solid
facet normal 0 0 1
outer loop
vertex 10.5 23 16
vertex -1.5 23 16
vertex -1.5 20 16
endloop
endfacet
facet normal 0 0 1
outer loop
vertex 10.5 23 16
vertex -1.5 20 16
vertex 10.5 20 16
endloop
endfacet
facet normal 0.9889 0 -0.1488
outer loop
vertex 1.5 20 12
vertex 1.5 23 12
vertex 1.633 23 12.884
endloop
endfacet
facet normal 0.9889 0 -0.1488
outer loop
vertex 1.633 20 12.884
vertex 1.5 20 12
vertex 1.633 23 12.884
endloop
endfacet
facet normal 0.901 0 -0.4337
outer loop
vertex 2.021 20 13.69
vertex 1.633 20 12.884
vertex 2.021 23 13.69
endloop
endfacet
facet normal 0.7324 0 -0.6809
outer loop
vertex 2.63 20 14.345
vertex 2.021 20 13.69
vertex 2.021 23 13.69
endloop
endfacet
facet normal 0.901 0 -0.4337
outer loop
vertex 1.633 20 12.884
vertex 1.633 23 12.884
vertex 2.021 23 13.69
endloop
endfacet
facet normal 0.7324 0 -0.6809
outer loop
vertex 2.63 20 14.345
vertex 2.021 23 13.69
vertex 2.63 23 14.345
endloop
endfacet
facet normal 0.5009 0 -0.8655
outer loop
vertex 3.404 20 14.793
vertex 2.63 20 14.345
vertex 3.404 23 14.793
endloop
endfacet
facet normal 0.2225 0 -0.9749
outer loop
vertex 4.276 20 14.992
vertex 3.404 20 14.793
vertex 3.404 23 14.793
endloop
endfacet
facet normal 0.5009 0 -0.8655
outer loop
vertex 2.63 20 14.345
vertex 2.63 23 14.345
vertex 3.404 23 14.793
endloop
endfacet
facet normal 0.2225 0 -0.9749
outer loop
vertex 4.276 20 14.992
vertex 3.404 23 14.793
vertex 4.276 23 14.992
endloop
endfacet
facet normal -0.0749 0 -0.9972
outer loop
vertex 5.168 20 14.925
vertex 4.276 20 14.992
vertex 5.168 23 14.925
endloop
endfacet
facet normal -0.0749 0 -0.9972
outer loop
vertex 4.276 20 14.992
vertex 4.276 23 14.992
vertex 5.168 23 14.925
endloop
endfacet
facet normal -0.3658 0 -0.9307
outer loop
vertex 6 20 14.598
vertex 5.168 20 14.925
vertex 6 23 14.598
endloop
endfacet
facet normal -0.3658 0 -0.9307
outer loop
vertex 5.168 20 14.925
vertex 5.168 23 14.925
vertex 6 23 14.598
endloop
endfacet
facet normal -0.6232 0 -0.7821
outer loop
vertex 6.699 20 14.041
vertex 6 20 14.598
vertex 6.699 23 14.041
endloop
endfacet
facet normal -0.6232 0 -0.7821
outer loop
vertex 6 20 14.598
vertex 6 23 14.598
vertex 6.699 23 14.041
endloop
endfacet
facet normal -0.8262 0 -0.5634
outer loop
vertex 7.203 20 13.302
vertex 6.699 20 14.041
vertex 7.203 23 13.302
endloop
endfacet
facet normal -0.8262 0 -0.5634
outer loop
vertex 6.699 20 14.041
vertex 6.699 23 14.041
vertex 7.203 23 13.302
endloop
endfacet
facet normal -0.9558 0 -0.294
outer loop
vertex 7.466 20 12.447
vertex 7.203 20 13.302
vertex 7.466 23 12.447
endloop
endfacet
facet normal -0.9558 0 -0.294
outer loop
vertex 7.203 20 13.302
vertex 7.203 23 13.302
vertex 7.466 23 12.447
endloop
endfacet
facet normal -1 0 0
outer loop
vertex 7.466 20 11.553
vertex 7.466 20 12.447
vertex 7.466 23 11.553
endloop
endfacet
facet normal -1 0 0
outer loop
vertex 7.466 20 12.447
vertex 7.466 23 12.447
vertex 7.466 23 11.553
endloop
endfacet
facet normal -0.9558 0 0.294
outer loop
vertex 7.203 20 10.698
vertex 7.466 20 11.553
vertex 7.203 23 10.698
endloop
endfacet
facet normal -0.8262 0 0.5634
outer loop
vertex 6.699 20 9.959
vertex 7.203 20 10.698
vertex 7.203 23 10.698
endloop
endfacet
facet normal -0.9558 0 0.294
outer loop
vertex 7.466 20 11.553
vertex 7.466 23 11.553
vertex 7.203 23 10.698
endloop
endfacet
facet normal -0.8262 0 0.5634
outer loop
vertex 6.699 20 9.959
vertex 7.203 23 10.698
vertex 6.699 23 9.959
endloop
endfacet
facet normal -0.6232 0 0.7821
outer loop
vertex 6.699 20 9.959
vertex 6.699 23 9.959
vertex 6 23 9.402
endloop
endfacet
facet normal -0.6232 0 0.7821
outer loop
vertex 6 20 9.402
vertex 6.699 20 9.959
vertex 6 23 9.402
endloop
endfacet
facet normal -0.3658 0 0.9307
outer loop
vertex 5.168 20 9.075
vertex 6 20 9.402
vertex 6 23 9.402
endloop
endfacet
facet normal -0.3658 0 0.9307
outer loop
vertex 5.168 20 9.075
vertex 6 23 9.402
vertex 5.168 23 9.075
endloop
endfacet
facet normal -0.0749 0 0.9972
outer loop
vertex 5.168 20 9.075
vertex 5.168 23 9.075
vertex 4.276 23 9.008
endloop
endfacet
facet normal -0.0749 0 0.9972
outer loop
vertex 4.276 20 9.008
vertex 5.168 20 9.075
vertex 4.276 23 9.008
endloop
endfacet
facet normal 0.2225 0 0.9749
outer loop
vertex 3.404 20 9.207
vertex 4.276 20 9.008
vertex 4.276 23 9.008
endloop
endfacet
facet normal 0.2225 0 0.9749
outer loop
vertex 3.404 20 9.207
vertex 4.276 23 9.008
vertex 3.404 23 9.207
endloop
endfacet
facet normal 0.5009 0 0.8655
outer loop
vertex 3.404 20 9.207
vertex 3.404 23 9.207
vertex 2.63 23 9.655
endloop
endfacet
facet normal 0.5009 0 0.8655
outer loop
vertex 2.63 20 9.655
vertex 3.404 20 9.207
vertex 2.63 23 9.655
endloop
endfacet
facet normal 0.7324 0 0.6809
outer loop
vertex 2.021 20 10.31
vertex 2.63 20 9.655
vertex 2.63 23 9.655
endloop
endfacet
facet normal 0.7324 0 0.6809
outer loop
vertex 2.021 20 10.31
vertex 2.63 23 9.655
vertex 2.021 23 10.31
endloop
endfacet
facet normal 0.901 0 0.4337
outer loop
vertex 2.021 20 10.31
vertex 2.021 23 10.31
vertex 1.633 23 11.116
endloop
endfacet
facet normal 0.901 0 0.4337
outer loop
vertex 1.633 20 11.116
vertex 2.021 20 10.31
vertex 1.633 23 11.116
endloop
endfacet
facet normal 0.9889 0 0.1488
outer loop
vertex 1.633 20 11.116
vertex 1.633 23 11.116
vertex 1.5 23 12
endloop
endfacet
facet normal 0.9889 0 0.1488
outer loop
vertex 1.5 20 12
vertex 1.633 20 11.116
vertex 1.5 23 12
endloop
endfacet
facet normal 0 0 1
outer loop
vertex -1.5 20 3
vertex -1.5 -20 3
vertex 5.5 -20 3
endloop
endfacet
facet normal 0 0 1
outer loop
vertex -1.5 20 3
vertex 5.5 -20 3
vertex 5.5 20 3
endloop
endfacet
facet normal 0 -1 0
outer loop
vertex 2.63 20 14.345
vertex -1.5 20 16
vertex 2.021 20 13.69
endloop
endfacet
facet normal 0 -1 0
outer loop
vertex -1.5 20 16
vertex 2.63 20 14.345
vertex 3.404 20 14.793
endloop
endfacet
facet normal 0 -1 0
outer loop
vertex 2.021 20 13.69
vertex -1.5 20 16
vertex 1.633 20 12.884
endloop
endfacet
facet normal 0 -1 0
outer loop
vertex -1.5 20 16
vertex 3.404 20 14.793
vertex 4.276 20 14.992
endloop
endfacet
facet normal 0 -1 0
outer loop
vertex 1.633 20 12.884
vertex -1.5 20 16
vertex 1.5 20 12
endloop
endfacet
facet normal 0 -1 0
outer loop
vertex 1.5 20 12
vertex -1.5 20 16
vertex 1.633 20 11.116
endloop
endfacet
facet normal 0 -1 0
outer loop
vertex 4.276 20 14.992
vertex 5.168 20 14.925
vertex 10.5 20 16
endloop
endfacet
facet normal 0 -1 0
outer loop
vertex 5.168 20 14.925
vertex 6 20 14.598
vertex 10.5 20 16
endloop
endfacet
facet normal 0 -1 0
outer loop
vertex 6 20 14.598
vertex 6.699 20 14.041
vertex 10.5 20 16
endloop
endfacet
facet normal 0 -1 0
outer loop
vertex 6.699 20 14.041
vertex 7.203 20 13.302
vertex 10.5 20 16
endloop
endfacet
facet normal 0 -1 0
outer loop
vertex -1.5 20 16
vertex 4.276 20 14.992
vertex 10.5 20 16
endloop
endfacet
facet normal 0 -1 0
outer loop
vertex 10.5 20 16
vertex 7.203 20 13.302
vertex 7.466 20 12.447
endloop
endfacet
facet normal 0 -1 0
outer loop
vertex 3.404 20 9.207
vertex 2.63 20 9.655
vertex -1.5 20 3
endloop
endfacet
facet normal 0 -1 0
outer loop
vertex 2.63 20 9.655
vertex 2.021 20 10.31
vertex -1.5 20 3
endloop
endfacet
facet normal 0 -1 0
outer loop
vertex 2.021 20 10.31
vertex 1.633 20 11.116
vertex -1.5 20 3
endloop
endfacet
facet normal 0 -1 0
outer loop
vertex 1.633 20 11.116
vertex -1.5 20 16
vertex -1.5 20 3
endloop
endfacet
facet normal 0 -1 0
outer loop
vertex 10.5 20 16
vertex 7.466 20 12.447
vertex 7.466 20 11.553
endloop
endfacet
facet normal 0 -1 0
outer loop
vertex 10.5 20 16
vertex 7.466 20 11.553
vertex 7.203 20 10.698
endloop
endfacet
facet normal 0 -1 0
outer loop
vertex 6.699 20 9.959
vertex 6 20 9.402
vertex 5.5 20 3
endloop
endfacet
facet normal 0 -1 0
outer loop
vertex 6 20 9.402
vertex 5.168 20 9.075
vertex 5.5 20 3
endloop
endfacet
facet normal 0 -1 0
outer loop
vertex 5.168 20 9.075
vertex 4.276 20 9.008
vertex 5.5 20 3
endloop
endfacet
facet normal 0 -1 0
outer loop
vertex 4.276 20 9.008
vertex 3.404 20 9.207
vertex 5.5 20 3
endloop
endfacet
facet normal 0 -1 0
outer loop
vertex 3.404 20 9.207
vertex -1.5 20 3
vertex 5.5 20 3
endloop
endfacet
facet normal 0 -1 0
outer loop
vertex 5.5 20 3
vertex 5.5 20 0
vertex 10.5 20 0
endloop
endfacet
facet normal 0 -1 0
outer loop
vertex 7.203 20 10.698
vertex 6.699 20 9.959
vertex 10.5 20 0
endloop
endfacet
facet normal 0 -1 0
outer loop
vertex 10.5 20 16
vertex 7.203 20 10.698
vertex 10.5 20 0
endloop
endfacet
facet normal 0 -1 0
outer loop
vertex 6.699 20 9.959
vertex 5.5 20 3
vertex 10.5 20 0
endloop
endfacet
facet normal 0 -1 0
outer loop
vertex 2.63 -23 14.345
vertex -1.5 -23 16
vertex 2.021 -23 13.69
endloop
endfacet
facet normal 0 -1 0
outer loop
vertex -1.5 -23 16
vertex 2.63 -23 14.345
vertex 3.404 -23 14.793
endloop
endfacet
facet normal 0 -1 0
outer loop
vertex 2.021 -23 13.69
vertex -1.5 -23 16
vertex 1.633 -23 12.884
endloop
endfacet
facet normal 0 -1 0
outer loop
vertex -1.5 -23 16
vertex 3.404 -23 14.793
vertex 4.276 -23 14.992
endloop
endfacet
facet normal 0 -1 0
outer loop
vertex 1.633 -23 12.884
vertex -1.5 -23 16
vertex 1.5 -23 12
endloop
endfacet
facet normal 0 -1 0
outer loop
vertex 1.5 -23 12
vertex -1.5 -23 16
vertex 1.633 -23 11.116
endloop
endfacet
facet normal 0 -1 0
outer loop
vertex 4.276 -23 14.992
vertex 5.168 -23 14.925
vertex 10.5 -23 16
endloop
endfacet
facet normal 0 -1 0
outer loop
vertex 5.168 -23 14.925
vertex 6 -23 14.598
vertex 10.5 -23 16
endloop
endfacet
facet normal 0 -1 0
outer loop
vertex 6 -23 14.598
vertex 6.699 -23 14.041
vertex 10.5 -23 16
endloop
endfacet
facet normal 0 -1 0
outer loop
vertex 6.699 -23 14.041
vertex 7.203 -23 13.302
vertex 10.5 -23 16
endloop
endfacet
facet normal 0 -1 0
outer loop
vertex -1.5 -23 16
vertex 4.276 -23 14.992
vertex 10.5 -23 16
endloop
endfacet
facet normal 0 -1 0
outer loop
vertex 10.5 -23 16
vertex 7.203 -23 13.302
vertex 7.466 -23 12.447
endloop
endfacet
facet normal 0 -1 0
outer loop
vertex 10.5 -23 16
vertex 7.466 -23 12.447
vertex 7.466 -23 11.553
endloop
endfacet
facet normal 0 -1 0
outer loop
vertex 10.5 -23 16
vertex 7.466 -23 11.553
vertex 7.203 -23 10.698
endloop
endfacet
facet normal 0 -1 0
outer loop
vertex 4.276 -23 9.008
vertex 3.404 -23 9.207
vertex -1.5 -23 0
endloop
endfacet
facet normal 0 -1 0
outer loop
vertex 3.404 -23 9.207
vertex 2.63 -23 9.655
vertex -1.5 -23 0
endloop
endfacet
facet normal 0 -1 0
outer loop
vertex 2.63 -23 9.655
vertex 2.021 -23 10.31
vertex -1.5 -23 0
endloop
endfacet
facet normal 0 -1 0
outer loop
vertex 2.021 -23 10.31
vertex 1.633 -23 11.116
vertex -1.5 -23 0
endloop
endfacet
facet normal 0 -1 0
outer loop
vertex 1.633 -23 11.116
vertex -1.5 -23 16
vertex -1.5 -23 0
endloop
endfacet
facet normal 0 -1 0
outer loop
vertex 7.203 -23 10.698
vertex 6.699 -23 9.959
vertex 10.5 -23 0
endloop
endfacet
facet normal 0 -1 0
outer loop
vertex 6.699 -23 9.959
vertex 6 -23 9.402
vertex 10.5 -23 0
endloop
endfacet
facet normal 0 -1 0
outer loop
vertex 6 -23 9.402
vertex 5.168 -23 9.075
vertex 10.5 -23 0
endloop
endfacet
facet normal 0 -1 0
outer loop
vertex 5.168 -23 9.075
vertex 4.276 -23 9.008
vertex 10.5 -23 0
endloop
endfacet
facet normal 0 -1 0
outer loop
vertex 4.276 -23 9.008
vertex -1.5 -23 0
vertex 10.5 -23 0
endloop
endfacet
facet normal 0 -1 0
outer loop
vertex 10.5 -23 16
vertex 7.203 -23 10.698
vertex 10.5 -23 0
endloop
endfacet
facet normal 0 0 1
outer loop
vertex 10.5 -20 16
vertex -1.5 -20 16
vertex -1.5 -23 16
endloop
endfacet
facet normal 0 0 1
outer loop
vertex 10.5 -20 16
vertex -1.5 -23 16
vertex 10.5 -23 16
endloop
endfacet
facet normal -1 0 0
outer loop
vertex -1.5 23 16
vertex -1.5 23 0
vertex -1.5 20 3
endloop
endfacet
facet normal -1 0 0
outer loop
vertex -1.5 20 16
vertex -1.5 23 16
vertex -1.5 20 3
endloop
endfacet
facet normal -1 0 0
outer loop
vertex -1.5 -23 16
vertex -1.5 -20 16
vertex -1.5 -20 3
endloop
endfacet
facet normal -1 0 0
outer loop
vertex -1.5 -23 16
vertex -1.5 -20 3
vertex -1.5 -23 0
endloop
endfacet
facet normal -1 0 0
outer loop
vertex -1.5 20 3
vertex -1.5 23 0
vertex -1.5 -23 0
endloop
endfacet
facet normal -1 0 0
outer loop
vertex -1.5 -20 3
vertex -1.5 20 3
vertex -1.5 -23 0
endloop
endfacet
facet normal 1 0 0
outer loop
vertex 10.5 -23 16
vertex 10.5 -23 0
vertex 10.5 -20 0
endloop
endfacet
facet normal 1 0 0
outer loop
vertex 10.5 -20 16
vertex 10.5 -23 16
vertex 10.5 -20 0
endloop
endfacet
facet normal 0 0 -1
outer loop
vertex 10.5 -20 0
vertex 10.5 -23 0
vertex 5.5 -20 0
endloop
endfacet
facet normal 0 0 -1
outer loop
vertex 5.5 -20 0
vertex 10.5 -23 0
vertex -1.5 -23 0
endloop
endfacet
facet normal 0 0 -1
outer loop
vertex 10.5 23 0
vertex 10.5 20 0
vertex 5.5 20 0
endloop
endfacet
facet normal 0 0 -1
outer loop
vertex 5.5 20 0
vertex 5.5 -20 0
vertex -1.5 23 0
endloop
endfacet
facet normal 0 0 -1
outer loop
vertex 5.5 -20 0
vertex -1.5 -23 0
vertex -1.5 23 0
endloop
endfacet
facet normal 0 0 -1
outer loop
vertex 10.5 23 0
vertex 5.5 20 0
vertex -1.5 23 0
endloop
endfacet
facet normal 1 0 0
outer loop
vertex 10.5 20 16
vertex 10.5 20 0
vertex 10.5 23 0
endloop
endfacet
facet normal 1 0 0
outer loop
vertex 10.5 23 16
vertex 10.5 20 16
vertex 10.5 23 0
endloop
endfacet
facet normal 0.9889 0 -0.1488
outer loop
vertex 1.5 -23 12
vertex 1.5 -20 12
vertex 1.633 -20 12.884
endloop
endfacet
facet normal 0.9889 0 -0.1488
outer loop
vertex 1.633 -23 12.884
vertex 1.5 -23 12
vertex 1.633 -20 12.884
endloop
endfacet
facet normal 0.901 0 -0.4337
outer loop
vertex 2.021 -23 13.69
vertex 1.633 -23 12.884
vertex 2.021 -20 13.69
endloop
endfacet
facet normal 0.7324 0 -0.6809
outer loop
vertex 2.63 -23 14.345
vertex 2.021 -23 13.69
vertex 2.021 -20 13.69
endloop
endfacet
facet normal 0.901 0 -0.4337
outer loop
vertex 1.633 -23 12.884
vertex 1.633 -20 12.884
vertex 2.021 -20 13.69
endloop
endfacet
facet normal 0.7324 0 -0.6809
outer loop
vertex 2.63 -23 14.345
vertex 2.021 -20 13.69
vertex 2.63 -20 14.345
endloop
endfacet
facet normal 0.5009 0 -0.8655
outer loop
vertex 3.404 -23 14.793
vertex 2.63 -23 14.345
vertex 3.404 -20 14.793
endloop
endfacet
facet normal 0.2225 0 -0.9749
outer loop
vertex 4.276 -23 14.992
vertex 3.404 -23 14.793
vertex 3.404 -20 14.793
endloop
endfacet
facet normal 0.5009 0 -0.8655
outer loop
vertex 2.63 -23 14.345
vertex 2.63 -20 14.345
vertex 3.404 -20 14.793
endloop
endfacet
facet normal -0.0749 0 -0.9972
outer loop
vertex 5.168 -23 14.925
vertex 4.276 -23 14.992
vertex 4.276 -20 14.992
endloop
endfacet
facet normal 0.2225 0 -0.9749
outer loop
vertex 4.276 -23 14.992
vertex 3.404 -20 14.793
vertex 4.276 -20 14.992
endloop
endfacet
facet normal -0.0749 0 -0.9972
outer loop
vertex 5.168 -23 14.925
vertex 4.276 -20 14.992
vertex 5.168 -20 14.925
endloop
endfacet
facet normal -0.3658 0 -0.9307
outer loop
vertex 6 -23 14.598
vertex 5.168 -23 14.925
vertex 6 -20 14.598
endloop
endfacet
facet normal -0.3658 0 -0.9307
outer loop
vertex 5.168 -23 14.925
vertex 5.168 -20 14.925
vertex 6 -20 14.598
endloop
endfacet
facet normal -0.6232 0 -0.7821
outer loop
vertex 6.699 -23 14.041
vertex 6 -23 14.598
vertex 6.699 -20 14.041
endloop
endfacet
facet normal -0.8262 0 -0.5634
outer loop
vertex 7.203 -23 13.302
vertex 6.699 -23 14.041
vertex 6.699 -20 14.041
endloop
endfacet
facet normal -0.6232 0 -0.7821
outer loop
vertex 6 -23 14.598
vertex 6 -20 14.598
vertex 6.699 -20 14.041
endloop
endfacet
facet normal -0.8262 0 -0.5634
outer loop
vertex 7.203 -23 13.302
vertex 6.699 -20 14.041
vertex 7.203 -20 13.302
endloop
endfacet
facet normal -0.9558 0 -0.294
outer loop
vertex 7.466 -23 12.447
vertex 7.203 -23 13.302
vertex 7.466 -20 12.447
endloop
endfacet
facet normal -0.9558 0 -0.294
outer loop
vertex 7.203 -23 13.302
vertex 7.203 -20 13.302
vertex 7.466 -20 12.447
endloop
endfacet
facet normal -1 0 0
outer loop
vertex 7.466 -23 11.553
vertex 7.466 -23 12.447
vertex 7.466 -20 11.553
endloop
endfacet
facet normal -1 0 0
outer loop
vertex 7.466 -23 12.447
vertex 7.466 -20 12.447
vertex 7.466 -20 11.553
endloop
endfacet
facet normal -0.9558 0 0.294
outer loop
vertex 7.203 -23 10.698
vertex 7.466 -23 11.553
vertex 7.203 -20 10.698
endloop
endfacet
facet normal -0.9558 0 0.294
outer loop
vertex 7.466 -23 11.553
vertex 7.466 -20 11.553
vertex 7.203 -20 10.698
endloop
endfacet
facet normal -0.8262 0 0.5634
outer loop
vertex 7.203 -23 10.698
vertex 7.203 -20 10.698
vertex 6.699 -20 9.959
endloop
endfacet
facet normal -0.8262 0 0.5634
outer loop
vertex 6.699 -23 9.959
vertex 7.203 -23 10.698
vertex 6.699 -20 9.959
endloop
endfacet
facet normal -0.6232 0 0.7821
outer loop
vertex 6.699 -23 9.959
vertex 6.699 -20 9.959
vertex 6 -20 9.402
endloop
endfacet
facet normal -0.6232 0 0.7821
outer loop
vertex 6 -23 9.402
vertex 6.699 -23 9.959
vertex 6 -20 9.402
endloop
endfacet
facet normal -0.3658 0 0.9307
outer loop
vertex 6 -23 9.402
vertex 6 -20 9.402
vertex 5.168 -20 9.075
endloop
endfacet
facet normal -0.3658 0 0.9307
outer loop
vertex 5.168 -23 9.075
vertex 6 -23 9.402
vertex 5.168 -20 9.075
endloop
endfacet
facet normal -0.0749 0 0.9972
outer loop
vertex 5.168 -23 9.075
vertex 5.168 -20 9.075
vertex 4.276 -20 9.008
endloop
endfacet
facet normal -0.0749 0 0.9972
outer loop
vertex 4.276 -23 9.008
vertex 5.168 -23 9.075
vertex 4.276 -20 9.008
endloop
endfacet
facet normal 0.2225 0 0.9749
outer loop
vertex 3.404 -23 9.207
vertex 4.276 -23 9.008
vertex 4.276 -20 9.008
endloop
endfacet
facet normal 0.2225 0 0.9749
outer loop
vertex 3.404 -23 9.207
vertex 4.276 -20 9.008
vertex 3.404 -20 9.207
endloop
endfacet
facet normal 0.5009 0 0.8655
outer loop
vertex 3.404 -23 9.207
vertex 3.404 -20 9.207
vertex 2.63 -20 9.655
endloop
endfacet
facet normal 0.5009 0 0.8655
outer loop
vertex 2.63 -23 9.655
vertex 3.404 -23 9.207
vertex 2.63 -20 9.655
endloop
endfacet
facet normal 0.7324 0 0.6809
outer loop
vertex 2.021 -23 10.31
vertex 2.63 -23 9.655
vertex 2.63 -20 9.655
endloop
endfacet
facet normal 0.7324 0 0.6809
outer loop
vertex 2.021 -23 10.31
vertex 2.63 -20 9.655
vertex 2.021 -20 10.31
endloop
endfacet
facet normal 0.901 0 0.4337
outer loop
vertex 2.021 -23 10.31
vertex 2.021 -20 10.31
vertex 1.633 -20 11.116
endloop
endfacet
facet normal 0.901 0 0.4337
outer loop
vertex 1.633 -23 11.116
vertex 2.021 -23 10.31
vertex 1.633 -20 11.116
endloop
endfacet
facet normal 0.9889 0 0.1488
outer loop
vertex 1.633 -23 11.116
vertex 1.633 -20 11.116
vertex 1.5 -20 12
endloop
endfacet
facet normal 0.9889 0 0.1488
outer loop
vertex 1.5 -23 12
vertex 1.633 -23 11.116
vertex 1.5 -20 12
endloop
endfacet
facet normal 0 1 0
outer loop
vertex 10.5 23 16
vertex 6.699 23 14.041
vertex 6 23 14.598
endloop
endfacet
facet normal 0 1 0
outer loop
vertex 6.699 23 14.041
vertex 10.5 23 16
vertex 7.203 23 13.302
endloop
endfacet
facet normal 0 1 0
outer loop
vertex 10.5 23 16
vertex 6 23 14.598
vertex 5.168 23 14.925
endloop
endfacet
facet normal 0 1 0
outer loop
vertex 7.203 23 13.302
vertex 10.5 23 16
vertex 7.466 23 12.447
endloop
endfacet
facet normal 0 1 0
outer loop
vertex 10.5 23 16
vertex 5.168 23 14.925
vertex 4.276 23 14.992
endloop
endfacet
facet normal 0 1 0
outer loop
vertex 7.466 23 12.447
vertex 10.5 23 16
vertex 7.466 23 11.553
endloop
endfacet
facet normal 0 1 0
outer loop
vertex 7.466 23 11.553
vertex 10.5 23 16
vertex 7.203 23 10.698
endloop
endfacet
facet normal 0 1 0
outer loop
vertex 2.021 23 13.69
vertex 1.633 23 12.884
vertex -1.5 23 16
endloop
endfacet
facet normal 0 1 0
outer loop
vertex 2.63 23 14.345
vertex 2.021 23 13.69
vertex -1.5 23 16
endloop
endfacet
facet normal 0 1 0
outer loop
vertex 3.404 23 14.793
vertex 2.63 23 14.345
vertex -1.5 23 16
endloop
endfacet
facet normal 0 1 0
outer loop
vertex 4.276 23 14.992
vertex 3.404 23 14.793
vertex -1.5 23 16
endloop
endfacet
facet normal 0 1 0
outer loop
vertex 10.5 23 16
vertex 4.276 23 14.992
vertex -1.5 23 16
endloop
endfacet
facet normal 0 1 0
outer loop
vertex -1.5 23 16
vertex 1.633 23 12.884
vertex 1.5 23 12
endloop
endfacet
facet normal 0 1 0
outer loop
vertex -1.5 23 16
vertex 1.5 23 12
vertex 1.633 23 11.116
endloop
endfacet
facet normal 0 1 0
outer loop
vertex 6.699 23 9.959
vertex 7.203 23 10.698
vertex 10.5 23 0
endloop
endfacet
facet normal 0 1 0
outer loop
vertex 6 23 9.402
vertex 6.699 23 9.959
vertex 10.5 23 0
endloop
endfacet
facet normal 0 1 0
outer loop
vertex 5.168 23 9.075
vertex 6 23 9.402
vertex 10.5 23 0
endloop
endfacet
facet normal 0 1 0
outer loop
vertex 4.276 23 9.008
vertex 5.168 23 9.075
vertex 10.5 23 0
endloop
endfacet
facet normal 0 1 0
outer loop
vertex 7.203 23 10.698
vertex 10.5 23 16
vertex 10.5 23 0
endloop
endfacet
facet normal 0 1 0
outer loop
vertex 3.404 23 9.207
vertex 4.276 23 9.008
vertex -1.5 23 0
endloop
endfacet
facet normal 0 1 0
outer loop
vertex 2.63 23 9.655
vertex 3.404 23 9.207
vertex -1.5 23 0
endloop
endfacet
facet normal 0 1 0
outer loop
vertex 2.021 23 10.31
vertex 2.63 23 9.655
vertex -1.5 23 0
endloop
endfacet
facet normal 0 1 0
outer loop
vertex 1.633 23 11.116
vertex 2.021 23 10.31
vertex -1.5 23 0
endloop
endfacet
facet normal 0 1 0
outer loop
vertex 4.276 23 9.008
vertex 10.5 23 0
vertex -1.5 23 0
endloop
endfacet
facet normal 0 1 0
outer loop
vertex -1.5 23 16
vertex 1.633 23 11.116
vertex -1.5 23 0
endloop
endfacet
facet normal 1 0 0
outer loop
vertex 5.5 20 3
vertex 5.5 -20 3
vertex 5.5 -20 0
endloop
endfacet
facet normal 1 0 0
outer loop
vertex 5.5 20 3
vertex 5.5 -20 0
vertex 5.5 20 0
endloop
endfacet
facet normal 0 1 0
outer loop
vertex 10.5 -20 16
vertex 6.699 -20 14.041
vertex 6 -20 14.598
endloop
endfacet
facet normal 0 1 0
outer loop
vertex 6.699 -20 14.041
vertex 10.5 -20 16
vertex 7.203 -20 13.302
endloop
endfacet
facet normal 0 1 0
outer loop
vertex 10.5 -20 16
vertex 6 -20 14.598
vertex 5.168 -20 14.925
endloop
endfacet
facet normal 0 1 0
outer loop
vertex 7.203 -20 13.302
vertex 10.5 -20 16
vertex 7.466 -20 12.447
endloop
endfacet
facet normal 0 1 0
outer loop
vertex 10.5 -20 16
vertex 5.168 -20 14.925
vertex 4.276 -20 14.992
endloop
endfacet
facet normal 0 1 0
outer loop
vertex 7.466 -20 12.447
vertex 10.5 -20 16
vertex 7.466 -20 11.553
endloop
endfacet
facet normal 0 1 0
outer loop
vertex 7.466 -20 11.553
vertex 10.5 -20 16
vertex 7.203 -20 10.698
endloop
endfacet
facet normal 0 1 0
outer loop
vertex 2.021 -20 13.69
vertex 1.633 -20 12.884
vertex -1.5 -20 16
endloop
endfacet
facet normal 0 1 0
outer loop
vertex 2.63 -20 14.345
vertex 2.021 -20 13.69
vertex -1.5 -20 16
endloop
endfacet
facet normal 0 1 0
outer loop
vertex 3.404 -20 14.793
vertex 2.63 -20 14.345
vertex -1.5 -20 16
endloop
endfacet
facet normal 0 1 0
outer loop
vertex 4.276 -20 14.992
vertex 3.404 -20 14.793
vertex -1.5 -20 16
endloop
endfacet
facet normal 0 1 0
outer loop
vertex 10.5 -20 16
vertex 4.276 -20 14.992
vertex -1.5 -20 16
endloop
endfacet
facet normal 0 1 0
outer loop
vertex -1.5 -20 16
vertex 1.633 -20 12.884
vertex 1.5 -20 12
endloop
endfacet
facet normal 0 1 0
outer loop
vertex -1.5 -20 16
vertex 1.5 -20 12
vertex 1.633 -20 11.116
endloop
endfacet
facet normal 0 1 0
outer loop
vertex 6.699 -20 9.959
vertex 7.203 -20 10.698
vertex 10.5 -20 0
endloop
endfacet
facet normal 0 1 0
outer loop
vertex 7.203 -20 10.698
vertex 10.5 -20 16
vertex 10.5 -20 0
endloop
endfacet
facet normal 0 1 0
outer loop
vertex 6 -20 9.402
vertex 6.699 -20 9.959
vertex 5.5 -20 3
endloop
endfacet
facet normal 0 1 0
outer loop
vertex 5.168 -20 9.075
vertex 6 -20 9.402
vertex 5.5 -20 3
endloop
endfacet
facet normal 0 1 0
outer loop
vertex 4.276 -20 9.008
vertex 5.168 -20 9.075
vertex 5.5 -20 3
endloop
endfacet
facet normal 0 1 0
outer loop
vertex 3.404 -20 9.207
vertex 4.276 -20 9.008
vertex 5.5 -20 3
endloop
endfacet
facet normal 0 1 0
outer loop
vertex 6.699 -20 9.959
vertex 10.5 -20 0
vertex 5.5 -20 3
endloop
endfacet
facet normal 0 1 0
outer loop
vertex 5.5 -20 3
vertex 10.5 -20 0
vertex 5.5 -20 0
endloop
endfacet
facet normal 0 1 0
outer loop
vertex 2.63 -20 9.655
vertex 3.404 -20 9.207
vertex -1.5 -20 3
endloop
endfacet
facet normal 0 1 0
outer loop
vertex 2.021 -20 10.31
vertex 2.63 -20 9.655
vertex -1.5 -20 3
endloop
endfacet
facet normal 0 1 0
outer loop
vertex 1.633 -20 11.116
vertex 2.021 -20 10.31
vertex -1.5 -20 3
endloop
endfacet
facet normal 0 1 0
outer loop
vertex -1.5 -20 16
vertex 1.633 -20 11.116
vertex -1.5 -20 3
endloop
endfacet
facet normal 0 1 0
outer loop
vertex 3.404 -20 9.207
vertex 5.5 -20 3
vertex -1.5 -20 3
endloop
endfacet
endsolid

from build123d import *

# Parameters (mm, degrees)
F0_W     = 3
F0_H     = 40
F1_DEPTH = 16
F3_D     = 6
F4_W     = 40
F4_H     = 3
F5_DEPTH = 4
F7_DEPTH = 25


with BuildPart() as f1:
    # F0 (on Top) → F1 (new body)
    with BuildSketch(Plane.XY):
        Polygon((-1.5, 23), (-1.5, 20), (1.5, 20), (10.5, 20), (10.5, 23), align=None)
        Rectangle(F0_W, F0_H)
        Polygon((1.5, -20), (-1.5, -20), (-1.5, -23), (10.5, -23), (10.5, -20), align=None)
    extrude(amount=F1_DEPTH)

    # F3 (through all)
    with Locations(Plane.XZ.offset(23)):
        with Locations((4.5, 12)):
            Hole(F3_D / 2)

    # F4 (on face) → F5 (join)
    with BuildSketch(Plane.YZ.offset(1.5)):
        with Locations((0, 1.5)):
            Rectangle(F4_W, F4_H)
    extrude(amount=F5_DEPTH)

    # F6 (on face) → F7 (cut)
    with BuildSketch(Plane.YZ.offset(1.5)):
        Polygon((20, 16), (-20, 16), (-20, 12), (-20, 3), (20, 3), (20, 12), align=None)
    extrude(amount=-F7_DEPTH, mode=Mode.SUBTRACT)


solid = f1.part
